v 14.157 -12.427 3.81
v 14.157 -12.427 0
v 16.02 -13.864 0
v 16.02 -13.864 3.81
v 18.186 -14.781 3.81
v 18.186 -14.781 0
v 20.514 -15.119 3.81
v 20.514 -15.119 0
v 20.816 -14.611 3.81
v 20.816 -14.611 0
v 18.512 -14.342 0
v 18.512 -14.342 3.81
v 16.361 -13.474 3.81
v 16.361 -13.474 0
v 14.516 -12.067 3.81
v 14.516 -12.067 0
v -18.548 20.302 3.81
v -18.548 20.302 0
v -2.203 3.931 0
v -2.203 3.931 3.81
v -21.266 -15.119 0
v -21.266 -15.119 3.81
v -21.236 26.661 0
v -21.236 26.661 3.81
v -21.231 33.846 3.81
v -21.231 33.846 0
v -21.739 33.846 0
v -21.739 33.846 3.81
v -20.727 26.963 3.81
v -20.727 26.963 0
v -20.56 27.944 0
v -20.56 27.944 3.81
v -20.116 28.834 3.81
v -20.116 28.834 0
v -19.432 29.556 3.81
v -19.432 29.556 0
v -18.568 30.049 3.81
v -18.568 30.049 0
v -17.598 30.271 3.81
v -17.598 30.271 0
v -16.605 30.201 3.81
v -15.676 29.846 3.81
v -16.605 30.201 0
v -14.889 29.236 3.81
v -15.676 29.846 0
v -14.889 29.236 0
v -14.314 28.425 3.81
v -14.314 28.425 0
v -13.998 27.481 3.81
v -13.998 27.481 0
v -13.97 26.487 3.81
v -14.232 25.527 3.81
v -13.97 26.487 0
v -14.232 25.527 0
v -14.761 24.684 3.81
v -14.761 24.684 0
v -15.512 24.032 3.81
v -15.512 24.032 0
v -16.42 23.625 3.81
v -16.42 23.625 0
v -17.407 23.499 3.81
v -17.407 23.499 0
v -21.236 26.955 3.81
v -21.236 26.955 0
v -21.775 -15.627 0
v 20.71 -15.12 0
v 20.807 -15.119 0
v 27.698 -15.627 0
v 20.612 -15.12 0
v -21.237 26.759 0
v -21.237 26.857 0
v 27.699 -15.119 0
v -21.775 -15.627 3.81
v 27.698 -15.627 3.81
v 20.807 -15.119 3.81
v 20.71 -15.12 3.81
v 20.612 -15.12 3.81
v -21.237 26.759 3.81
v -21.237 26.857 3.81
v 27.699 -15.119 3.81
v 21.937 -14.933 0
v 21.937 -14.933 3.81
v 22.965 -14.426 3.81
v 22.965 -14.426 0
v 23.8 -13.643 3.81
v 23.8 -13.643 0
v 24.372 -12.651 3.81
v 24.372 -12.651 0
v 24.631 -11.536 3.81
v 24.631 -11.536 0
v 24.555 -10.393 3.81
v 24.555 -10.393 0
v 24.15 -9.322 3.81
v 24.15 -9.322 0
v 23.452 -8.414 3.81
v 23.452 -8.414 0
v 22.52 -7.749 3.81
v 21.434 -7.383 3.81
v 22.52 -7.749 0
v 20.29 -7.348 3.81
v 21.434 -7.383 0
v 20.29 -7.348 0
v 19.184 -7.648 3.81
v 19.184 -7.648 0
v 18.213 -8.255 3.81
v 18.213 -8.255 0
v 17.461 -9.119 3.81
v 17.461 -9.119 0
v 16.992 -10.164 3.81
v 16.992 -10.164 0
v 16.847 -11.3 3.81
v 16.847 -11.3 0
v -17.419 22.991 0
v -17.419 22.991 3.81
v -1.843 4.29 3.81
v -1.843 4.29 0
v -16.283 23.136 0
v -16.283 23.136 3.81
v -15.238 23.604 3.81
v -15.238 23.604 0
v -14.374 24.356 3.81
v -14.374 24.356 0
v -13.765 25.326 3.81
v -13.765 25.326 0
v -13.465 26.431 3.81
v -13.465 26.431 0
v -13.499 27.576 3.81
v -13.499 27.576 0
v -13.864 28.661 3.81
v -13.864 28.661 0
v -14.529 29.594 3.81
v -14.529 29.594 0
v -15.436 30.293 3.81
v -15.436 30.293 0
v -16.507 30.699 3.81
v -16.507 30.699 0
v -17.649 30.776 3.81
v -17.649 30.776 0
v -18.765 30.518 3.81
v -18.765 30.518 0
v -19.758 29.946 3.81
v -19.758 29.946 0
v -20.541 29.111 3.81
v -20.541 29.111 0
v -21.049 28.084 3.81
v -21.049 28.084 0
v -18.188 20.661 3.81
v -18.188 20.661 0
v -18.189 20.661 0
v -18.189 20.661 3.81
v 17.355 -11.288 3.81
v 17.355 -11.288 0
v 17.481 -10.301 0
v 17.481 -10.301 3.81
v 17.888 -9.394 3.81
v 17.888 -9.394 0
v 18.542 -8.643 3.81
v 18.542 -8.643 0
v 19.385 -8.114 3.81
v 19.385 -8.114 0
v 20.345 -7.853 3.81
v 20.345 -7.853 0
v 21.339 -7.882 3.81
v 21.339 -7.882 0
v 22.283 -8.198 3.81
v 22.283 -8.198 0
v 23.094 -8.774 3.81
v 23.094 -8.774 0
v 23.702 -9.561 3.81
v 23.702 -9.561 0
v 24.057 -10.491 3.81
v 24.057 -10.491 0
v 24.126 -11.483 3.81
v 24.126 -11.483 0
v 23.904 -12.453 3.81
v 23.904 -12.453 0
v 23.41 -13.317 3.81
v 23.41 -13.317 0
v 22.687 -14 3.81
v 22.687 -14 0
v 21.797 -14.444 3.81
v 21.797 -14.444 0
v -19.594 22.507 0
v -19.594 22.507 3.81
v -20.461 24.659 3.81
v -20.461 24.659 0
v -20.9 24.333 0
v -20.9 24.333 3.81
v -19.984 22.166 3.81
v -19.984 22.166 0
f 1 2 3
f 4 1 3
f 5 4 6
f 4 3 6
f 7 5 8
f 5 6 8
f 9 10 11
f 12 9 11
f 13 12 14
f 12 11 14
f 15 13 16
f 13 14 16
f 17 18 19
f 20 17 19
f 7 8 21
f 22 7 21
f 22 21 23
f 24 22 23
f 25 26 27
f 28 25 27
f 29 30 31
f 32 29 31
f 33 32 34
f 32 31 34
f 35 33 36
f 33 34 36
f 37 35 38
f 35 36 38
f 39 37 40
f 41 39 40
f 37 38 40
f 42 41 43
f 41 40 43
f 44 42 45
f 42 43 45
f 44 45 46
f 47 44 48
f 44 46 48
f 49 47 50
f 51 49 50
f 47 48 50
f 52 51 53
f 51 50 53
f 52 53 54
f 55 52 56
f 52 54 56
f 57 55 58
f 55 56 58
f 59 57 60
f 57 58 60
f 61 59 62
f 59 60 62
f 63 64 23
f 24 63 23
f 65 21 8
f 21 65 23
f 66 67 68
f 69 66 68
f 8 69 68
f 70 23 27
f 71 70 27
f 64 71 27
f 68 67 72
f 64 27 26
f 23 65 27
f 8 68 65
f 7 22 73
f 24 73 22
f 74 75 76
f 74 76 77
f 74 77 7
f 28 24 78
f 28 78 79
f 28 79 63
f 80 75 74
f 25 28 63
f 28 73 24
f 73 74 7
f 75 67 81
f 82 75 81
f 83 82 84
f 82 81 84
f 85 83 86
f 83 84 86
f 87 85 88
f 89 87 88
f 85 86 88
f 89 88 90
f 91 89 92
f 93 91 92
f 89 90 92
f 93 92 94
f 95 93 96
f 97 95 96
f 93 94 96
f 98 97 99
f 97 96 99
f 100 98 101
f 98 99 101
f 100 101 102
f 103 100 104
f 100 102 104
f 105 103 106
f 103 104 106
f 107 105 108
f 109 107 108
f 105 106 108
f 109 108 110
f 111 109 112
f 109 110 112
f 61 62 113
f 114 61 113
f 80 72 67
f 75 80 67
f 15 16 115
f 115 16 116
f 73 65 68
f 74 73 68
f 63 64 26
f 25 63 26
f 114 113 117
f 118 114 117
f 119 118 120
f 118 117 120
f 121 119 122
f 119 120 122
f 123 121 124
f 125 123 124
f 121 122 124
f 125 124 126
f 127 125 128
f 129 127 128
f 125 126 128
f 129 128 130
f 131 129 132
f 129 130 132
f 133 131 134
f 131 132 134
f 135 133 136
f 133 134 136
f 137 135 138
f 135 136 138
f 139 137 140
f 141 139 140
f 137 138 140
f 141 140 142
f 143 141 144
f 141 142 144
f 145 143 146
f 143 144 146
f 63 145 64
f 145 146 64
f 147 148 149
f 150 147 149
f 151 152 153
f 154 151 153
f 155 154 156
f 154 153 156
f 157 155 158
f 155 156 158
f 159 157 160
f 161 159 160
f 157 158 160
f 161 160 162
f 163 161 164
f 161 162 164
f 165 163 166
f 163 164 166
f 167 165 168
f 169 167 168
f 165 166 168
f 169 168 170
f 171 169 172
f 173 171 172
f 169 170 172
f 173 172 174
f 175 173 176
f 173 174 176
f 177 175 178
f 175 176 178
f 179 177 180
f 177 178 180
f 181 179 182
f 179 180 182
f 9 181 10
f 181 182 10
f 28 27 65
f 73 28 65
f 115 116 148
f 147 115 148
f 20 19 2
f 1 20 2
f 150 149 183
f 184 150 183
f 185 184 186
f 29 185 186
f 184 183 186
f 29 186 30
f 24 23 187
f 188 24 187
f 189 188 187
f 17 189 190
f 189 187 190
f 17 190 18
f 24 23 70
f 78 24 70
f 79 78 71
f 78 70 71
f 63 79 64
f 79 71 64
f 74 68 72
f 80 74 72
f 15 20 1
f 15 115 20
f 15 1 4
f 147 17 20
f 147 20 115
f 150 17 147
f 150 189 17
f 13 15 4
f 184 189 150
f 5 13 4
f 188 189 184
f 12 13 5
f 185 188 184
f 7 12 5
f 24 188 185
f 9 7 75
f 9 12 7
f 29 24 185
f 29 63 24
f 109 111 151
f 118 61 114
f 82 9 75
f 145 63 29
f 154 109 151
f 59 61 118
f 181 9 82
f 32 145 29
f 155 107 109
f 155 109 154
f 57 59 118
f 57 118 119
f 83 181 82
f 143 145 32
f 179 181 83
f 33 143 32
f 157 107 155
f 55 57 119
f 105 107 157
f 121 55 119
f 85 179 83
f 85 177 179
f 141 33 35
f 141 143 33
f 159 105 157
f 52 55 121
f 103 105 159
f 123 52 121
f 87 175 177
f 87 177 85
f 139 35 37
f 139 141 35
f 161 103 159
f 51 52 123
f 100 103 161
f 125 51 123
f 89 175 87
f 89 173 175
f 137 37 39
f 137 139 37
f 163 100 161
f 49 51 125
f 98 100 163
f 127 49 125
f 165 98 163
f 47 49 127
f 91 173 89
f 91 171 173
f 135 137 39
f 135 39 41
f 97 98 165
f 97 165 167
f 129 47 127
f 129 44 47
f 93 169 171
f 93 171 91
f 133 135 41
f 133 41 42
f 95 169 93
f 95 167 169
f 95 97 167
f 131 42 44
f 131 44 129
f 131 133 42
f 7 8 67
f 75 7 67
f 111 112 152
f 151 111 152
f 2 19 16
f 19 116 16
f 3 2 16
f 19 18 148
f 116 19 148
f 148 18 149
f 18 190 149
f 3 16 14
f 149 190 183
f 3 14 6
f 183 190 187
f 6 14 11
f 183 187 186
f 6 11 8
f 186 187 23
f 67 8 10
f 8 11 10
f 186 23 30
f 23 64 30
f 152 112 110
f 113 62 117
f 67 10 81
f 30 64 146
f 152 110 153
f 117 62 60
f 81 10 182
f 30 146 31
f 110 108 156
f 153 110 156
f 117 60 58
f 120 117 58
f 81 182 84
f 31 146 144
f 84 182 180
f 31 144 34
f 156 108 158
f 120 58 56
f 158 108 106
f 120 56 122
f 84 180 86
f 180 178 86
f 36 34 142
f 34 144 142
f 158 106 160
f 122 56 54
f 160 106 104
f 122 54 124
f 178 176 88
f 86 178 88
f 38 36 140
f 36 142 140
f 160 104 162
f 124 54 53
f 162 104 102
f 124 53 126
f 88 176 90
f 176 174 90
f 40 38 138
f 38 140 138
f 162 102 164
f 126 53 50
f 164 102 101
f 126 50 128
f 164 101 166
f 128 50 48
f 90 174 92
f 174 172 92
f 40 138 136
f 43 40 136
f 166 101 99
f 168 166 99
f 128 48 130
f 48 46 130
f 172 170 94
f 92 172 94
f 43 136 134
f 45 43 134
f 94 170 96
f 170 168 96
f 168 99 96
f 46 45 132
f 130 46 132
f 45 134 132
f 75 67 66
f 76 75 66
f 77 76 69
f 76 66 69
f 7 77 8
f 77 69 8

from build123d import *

# Parameters (mm, degrees)
F1_DEPTH = 3.81


# Not quite as in the source:
# - ends of sketch curves that miss each other by under 0.0002 mm in the source are joined


with BuildPart() as f1:
    # F0 (on Top) → F1 (new body)
    with BuildSketch(Plane.XY):
        with BuildLine():
            Line((20.5140408279, -15.1191436985), (-21.2663591647, -15.1191436985))
            Line((-21.2663591647, -15.1191436985), (-21.2358744499, 26.6612451727))
            ThreePointArc((-21.2358744499, 26.6612451727), (-21.2369365638, 26.8078953852), (-21.2356604469, 26.9545438918))
            Line((-21.2356604469, 26.9545438918), (-21.2306322042, 33.8459297569))
            Line((-21.2306322042, 33.8459297569), (-21.7386323148, 33.8459635813))
            Line((-21.7386323148, 33.8459635813), (-21.7747299579, -15.6271436985))
            Line((-21.7747299579, -15.6271436985), (27.6983904911, -15.6271436985))
            Line((27.6983904911, -15.6271436985), (27.6987273246, -15.1191436985))
            Line((27.6987273246, -15.1191436985), (20.8073396251, -15.1191436985))
            ThreePointArc((20.8073396251, -15.1191436985), (20.6606902265, -15.1203128143), (20.5140408279, -15.1191436985))
        make_face()
    extrude(amount=F1_DEPTH)


with BuildPart() as f1b:
    # F0 (on Top) → F1, piece 2 (new body)
    with BuildSketch(Plane.XY):
        with BuildLine():
            Line((-18.5480440044, 20.3022931542), (-2.2025689312, 3.9307418728))
            Line((-2.2025689312, 3.9307418728), (-1.8432276294, 4.2898210799))
            Line((-1.8432276294, 4.2898210799), (-18.1881377204, 20.6608064779))
            Line((-18.1881377204, 20.6608064779), (-18.1885475751, 20.6612169864))
            ThreePointArc((-18.1885475751, 20.6612169864), (-20.0993272211, 23.553656443), (-20.727434667, 26.9628742275))
            ThreePointArc((-20.727434667, 26.9628742275), (-14.8892020702, 29.236140209), (-17.4071495964, 23.4992255697))
            Line((-17.4071495964, 23.4992255697), (-17.4192153155, 22.9913667341))
            ThreePointArc((-17.4192153155, 22.9913667341), (-14.5286368513, 29.5940863142), (-21.2356604469, 26.9545438918))
            Line((-21.2356604469, 26.9545438918), (-21.2358744499, 26.6612451727))
            ThreePointArc((-21.2358744499, 26.6612451727), (-20.5111762537, 23.2200357251), (-18.5480440044, 20.3022931542))
        make_face()
        with BuildLine():
            Line((-1.8432276294, 4.2898210799), (-2.2025689312, 3.9307418728))
            Line((-2.2025689312, 3.9307418728), (14.1570516549, -12.4266742131))
            ThreePointArc((14.1570516549, -12.4266742131), (17.0733610662, -14.3919348459), (20.5140408279, -15.1191436985))
            Line((20.5140408279, -15.1191436985), (20.8073396251, -15.1191436985))
            ThreePointArc((20.8073396251, -15.1191436985), (23.4517750679, -8.414047808), (16.8469481592, -11.2998078844))
            Line((16.8469481592, -11.2998078844), (17.3548156633, -11.2881127234))
            ThreePointArc((17.3548156633, -11.2881127234), (23.0935659746, -8.7743517586), (20.8160725307, -14.6108980778))
            ThreePointArc((20.8160725307, -14.6108980778), (17.4072821975, -13.9803293465), (14.516237695, -12.0674397652))
            ThreePointArc((14.516237695, -12.0674397652), (14.5160325938, -12.0672346847), (14.5158274993, -12.0670295974))
            Line((14.5158274993, -12.0670295974), (-1.8432276294, 4.2898210799))
        make_face()
    extrude(amount=F1_DEPTH)


solid = Compound([f1.part, f1b.part])
